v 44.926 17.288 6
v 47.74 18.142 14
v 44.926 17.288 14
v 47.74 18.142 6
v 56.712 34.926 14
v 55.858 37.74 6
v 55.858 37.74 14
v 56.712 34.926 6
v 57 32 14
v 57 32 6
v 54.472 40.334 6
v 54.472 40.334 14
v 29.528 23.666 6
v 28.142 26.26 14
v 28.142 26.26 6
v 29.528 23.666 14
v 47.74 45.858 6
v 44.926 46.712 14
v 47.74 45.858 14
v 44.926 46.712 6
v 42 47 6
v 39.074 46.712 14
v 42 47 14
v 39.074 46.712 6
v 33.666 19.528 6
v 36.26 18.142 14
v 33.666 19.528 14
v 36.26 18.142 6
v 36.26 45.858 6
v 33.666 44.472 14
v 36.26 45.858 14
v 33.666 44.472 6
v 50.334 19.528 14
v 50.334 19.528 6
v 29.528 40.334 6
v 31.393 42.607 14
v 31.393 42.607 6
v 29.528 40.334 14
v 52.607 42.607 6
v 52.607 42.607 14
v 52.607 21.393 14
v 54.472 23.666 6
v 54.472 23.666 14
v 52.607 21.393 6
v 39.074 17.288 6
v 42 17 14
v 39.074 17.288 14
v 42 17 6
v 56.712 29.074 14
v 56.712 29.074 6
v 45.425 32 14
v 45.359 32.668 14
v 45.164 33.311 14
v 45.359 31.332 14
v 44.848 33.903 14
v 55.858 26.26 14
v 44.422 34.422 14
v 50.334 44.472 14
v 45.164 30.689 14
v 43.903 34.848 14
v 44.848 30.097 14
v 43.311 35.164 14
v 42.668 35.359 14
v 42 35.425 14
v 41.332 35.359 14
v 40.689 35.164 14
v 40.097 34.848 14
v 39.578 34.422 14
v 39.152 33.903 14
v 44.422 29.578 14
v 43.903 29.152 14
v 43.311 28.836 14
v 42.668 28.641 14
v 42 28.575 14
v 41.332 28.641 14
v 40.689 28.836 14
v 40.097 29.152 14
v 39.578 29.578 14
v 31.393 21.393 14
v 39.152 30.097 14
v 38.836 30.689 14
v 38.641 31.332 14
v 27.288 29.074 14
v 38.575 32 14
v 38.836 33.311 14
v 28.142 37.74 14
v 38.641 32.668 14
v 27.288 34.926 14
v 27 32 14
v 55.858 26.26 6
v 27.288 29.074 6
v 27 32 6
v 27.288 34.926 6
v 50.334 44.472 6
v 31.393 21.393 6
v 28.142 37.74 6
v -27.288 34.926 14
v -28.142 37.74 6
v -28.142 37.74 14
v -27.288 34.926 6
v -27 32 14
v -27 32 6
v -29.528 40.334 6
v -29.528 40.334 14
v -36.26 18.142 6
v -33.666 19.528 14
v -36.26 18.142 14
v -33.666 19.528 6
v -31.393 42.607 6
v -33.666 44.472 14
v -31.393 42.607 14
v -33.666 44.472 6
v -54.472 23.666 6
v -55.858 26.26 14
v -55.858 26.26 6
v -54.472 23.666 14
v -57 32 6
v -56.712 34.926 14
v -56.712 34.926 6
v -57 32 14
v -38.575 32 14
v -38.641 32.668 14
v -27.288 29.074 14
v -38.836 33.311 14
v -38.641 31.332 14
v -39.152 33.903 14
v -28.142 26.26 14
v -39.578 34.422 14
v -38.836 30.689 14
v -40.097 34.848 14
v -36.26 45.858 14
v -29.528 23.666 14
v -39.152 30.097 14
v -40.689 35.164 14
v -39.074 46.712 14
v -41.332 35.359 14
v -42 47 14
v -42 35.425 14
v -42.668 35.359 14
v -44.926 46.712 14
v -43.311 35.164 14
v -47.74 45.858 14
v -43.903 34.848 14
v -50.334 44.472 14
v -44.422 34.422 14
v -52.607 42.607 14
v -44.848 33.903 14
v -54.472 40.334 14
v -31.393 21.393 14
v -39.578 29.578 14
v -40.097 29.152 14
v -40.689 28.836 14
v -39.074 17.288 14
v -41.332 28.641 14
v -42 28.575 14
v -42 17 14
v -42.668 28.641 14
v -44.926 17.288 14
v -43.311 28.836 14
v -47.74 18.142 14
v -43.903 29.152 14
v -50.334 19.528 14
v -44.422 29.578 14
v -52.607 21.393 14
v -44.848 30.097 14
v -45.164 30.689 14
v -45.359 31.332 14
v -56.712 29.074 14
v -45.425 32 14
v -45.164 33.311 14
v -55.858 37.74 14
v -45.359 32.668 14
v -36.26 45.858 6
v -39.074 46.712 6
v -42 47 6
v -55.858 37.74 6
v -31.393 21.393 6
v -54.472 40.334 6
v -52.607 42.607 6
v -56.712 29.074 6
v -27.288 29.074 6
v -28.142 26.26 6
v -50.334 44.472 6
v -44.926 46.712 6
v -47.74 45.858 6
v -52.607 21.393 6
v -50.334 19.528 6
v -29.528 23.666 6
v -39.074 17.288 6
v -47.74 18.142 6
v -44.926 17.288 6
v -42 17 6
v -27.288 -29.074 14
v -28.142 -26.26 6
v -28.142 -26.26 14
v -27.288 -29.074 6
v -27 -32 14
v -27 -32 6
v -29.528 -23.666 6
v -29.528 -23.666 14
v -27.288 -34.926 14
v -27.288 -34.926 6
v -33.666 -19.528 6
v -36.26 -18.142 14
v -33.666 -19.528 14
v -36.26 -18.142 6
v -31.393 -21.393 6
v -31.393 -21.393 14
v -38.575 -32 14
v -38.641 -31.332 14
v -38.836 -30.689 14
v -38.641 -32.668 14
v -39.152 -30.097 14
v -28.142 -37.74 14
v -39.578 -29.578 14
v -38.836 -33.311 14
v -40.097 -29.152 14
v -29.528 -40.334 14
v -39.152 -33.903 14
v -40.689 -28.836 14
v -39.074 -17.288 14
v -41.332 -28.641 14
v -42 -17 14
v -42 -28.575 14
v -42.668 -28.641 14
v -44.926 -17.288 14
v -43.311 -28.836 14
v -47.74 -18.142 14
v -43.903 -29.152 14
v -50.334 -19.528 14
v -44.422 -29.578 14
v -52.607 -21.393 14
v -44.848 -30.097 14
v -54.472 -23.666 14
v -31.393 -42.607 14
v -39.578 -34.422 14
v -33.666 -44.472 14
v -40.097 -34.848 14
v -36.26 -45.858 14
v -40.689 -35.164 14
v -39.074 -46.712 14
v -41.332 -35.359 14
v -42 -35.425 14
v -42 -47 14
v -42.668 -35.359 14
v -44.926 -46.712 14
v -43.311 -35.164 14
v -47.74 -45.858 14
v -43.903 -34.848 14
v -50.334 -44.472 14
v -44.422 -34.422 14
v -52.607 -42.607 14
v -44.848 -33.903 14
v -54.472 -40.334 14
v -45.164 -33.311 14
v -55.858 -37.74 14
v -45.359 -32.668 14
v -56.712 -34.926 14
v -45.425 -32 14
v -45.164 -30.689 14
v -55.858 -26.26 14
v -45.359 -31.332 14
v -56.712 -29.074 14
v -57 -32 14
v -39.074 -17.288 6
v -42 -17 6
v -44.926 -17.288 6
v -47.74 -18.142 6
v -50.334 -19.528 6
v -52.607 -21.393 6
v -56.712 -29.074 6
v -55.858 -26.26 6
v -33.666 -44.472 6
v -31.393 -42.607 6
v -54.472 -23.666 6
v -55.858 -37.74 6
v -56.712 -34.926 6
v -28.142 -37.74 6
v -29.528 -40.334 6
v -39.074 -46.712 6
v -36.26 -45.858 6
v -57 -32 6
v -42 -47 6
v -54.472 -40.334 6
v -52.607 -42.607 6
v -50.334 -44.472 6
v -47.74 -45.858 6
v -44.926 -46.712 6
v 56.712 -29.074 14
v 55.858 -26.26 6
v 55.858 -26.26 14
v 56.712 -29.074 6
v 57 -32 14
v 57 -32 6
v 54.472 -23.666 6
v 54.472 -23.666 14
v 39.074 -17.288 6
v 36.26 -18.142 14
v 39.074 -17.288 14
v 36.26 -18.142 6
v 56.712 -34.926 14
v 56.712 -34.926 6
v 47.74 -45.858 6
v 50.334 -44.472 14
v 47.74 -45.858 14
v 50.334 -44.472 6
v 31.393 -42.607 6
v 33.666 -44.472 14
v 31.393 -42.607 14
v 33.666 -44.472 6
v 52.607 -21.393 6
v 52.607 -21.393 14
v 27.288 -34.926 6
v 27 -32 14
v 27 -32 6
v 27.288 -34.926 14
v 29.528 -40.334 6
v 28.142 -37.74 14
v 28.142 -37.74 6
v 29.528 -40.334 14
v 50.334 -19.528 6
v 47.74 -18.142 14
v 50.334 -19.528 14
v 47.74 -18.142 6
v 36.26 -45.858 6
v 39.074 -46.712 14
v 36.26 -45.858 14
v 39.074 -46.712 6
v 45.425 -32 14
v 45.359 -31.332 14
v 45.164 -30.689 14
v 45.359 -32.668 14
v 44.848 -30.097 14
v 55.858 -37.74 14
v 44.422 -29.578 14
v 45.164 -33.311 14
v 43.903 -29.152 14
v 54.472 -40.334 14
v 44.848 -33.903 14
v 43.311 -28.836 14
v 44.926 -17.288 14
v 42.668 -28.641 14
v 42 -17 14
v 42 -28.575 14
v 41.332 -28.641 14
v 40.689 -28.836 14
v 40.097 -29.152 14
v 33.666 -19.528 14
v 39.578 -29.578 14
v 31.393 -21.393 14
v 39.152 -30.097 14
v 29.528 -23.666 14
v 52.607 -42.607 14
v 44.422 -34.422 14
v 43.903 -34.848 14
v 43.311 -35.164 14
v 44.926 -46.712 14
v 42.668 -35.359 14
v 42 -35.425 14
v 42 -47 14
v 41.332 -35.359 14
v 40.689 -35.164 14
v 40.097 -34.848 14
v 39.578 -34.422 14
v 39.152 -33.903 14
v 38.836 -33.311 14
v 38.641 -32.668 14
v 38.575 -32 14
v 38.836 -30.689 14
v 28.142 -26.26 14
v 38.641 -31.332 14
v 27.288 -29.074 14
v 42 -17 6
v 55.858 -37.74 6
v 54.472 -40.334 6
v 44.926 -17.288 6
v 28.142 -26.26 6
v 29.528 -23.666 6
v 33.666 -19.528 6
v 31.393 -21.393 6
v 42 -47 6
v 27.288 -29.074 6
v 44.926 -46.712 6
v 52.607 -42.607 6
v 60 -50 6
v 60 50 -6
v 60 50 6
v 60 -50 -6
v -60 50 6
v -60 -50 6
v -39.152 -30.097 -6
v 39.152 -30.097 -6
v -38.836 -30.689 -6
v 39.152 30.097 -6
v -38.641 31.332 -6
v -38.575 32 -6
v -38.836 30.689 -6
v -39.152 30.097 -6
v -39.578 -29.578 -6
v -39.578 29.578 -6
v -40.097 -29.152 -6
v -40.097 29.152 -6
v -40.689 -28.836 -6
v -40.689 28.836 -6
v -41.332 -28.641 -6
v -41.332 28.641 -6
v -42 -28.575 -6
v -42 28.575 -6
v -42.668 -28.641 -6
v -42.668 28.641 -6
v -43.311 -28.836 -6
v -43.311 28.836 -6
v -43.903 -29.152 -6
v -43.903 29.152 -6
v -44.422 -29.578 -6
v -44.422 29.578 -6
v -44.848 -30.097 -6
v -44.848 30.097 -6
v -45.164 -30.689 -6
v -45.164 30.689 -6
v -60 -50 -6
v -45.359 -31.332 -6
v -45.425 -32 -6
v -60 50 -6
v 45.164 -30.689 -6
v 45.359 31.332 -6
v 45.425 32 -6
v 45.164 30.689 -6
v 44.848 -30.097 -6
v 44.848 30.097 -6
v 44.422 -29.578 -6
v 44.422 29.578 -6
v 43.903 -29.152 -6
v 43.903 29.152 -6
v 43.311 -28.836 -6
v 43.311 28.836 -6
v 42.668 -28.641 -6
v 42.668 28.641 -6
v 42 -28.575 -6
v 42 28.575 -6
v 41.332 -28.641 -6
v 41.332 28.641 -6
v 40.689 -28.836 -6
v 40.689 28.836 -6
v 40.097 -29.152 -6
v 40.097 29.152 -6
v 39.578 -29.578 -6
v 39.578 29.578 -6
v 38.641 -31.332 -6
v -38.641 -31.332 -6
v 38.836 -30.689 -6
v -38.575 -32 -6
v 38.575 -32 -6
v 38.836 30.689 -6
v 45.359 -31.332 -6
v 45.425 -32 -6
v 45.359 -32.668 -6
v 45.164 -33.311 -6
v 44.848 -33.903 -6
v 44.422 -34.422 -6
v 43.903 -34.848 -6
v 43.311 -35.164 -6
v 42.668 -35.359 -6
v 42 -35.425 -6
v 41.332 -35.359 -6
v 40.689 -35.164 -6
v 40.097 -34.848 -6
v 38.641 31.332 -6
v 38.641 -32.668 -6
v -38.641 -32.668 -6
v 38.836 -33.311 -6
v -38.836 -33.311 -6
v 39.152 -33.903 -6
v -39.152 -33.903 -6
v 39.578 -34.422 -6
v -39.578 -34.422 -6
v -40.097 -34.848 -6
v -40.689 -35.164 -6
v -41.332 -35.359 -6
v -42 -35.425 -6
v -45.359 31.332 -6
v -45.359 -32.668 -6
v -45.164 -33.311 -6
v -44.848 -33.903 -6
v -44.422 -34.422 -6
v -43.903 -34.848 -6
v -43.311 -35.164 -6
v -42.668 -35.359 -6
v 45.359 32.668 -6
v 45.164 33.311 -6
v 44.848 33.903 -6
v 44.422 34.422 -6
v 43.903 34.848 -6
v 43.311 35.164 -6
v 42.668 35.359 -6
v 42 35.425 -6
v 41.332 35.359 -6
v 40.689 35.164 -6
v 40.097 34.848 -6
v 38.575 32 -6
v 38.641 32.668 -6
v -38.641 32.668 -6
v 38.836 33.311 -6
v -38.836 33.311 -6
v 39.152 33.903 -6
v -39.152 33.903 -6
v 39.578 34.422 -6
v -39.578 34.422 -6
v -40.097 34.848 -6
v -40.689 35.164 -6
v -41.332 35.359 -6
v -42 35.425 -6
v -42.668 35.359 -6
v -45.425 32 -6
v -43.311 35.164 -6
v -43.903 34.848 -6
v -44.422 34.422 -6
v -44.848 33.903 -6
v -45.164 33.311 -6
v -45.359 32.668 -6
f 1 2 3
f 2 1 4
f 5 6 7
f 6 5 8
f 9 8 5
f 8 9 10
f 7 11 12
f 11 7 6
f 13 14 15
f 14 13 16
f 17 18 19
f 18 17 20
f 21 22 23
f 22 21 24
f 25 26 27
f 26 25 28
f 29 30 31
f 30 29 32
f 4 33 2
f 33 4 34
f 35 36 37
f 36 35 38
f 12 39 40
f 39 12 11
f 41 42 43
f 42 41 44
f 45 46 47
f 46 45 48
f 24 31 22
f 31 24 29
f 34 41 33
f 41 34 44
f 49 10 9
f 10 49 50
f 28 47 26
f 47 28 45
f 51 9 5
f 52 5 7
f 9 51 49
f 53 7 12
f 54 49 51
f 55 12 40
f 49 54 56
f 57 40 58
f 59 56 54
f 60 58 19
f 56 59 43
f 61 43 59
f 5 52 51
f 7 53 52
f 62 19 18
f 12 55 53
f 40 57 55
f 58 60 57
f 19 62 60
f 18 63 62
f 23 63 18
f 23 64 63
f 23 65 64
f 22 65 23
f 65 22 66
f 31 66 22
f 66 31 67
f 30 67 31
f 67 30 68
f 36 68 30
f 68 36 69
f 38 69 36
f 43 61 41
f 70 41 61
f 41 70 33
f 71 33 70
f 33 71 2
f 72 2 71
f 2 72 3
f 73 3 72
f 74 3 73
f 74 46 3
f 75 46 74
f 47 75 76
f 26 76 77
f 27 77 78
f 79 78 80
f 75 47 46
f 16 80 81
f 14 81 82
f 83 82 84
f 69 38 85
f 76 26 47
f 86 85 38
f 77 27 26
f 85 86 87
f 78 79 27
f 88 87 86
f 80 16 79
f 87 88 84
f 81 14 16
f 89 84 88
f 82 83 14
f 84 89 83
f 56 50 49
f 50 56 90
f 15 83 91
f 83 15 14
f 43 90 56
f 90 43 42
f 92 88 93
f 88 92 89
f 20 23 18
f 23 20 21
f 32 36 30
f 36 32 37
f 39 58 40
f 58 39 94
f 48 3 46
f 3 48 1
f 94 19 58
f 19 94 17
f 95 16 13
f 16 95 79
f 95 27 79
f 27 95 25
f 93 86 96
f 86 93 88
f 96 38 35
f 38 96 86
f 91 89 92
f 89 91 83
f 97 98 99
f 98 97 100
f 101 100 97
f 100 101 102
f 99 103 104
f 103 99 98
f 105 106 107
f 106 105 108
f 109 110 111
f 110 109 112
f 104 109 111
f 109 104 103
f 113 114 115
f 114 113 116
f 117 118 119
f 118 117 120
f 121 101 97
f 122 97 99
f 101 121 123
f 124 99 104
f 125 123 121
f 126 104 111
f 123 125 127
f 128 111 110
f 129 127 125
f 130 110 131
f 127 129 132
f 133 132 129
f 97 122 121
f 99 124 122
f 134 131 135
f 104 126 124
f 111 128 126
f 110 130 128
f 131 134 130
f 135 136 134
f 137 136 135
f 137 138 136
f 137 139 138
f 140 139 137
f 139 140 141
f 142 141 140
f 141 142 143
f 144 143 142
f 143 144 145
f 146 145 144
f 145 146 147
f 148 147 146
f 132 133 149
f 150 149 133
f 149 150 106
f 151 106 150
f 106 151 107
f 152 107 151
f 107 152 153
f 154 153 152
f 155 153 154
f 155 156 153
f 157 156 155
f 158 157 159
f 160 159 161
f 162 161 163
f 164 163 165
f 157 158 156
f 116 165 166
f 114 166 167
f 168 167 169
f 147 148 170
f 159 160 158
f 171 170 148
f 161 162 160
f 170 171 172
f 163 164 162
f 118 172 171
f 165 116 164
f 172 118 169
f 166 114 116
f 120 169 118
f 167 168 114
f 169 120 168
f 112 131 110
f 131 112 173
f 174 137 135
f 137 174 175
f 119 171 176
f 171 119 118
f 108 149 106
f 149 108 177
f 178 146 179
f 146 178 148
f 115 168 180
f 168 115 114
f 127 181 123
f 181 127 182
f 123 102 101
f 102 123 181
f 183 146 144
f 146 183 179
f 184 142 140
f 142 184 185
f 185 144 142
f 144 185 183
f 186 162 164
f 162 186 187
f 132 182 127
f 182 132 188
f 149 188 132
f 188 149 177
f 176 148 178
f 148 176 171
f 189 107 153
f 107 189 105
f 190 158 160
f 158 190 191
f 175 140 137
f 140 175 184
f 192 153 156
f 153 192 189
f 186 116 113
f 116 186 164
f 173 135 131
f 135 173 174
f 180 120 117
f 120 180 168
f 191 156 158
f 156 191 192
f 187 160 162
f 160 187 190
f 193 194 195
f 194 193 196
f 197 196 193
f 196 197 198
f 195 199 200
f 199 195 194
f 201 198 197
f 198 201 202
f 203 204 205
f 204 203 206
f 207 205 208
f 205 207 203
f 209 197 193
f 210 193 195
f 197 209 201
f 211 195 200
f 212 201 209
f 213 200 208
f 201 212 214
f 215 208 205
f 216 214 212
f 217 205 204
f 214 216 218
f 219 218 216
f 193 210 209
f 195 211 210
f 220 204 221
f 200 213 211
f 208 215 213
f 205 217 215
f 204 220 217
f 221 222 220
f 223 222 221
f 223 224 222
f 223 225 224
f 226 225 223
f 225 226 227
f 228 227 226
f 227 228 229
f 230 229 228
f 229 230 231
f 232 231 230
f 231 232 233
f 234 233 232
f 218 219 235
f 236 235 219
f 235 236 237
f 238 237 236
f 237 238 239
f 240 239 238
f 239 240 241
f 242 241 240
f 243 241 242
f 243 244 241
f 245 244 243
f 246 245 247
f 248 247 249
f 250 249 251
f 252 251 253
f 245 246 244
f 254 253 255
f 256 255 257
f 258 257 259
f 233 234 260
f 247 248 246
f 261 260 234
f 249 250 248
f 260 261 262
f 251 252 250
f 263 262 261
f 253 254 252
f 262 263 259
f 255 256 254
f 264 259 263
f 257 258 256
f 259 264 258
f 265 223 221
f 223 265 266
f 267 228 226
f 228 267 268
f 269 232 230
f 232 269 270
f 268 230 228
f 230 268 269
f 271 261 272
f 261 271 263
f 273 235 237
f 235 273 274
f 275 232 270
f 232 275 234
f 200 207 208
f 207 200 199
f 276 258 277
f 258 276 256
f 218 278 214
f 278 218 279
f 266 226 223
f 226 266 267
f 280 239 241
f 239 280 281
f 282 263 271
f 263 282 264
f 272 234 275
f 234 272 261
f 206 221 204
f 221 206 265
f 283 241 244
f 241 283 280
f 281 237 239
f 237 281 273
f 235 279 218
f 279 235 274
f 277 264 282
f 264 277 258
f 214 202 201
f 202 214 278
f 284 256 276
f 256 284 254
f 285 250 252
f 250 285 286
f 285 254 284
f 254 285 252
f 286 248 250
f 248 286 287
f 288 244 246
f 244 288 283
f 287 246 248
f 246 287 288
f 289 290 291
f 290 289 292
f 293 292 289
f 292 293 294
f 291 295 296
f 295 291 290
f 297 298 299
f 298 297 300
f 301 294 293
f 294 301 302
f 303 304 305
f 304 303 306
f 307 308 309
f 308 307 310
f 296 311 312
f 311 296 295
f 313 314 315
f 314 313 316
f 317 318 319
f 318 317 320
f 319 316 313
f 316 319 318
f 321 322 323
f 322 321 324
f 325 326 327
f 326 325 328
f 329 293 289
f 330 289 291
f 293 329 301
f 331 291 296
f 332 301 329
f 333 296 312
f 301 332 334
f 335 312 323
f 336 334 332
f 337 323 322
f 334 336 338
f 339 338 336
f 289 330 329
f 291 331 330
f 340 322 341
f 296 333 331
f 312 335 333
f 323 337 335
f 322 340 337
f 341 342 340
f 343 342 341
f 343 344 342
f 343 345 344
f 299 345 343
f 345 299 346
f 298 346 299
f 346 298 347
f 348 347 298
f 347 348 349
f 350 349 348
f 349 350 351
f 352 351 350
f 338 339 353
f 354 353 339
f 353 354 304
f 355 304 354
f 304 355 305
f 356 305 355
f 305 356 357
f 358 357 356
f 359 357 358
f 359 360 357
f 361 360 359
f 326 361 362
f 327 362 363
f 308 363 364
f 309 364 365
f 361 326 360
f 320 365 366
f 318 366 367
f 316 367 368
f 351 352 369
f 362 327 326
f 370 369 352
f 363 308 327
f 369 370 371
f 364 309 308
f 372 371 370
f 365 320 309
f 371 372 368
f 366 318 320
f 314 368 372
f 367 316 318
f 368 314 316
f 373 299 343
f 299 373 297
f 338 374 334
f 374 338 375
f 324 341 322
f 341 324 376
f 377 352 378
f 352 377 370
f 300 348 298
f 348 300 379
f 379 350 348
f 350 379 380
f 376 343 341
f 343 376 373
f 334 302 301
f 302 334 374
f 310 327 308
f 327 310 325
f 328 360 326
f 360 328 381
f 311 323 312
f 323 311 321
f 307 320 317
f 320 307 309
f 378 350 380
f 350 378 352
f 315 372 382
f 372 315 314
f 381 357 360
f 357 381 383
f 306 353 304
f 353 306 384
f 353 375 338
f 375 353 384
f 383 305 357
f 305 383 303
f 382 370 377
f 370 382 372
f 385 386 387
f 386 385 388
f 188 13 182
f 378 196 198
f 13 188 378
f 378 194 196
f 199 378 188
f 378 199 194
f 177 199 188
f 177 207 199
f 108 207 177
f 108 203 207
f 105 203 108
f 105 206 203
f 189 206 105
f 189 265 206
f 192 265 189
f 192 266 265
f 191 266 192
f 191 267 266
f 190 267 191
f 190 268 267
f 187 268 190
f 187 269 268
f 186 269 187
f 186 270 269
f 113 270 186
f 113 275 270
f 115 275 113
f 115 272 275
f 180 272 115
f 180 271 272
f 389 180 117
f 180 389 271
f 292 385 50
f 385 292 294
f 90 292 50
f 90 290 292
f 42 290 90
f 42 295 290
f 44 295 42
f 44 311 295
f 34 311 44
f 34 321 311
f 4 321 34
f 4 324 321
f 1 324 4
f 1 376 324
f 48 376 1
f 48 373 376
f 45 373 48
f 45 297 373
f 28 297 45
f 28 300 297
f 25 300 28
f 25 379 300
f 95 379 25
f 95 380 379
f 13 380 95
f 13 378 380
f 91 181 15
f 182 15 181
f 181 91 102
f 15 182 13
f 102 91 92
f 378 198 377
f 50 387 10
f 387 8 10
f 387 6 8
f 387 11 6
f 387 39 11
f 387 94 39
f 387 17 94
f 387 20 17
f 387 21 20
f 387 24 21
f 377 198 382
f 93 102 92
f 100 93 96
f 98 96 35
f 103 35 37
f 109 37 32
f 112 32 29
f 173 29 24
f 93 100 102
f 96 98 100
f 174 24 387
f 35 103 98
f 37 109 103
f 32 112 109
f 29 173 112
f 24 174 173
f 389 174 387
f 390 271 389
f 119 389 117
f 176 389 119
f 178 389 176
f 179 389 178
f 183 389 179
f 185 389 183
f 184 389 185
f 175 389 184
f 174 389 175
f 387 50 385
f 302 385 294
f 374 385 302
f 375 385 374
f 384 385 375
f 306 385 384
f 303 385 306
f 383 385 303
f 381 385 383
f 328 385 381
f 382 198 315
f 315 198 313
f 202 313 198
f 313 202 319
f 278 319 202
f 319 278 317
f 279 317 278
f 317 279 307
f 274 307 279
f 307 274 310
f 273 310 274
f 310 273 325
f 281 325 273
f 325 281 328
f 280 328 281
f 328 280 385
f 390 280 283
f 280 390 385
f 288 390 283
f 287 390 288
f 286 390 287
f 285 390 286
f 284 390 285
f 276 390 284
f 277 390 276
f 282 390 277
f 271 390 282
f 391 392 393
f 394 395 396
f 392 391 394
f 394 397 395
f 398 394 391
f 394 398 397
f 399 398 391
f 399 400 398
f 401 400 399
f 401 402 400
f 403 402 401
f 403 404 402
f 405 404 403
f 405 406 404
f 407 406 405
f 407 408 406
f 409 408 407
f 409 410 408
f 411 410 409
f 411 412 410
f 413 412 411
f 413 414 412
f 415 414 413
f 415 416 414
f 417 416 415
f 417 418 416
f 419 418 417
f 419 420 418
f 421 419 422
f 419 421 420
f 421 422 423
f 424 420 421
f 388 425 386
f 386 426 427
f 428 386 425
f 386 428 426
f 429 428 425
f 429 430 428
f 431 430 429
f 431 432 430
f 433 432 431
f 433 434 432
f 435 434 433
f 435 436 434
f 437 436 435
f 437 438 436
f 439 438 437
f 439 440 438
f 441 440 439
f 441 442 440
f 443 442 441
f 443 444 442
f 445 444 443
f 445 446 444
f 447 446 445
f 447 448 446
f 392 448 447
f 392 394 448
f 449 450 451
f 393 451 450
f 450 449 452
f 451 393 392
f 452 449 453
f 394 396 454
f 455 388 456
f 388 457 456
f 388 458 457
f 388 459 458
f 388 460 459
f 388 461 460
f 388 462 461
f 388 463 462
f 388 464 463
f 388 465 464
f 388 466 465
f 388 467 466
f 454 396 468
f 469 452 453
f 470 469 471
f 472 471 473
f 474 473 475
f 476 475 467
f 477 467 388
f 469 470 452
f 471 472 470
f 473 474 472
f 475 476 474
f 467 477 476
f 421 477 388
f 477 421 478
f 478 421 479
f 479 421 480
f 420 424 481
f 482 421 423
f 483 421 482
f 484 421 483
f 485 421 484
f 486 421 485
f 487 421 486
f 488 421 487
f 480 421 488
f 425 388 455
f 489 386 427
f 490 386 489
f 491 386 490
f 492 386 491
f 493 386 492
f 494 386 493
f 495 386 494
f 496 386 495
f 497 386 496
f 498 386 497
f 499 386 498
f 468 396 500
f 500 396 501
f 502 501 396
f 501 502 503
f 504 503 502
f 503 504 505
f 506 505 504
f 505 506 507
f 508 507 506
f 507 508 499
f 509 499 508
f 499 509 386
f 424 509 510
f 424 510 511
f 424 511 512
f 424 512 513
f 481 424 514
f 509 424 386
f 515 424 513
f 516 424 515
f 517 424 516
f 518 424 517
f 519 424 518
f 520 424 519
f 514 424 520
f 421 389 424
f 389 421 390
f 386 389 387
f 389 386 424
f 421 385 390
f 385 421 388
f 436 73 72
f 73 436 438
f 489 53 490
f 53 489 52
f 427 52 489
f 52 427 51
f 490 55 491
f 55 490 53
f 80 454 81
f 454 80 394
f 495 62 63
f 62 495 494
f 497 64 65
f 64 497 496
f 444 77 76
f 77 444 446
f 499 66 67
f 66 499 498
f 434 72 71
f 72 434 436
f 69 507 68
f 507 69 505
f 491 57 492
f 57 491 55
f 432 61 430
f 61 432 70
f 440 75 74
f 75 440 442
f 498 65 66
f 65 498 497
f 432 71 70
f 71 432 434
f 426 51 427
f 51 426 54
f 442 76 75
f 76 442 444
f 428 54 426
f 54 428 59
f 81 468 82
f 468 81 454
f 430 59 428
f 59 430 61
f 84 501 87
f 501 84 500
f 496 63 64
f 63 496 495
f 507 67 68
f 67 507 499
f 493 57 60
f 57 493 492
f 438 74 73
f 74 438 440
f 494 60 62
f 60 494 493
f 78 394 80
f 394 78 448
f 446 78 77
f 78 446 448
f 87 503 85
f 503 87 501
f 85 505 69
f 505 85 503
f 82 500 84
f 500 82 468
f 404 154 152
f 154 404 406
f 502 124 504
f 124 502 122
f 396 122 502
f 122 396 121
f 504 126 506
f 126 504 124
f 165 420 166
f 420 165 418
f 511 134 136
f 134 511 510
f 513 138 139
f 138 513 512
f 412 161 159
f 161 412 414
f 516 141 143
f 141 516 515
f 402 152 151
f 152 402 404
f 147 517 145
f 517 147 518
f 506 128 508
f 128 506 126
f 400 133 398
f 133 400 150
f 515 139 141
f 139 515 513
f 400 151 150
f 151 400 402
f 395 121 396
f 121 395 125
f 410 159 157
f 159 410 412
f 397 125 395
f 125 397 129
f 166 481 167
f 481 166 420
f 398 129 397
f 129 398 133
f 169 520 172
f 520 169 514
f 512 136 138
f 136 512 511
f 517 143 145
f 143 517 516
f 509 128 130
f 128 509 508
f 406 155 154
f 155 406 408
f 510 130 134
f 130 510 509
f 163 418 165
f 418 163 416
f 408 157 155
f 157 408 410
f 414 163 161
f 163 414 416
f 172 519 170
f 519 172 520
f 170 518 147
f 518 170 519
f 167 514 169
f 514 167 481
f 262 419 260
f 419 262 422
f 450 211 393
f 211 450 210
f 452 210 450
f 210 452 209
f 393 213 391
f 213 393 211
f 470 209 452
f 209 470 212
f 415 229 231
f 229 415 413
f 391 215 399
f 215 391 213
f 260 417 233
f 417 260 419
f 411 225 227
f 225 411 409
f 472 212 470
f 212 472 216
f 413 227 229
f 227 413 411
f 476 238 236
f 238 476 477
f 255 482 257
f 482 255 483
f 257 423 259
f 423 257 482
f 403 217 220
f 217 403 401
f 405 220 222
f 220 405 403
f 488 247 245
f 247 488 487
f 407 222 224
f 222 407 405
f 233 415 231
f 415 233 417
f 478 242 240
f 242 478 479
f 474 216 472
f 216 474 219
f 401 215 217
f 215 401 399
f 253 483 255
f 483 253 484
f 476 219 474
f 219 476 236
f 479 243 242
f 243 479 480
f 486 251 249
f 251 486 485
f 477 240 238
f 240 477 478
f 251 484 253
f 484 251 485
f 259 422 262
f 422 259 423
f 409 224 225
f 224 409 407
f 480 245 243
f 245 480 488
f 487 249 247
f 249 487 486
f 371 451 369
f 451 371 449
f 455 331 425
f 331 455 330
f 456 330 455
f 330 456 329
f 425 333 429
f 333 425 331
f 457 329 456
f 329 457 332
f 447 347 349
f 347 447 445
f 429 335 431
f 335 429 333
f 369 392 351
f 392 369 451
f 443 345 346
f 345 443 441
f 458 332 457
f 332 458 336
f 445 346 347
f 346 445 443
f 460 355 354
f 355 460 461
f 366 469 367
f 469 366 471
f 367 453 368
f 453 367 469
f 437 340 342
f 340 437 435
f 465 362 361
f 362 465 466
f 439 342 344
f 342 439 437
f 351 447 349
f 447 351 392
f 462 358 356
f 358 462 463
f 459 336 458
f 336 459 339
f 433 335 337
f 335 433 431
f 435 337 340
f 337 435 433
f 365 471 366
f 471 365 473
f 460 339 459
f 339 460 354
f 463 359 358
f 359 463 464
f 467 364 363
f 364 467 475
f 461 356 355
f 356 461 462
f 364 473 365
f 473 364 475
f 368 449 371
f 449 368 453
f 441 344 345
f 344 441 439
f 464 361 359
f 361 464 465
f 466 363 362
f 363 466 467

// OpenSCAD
$fn = 32;

// ----------------------------------------------------------------------
// Anchor pads 120 x 100 x 20
// four corner bosses with anchor holes
// ----------------------------------------------------------------------

// --- parameters (mm) ---
plate = [120, 100, 12];  // base plate size (x, y, z)
pads = 4;                // boss count, one per corner
edge = 18;               // boss centre offset from the plate edge
boss_d = 30;             // boss diameter
boss_h = 8;              // boss height above the base plate
bore_d = 6.6;            // nominal hole diameter from the drawing
print_allowance = 0.25;  // clearance added for printing

// --- derived feature positions (mm) ---
hole_d = bore_d + print_allowance;  // = 6.85   hole diameter as printed
height = plate[2] + boss_h;         // = 20   overall height of the part
corner_x = plate[0] / 2 - edge;     // = 42   boss centre X
corner_y = plate[1] / 2 - edge;     // = 32   boss centre Y
feature_centers = [
  [corner_x, corner_y],
  [-corner_x, corner_y],
  [-corner_x, -corner_y],
  [corner_x, -corner_y]
];   // boss centres, anchor holes are drilled there

// base plate, four bosses standing on it, anchor holes all the way through
difference() {
  union() {
    cube(plate, center = true);
    for (centre = feature_centers)
      translate([centre[0], centre[1], plate[2] / 2 - 1])
        cylinder(d = boss_d, h = boss_h + 1);
  }
  for (centre = feature_centers)
    translate([centre[0], centre[1], -height])
      cylinder(d = hole_d, h = 2 * height + 2);  // through boss and plate
}
